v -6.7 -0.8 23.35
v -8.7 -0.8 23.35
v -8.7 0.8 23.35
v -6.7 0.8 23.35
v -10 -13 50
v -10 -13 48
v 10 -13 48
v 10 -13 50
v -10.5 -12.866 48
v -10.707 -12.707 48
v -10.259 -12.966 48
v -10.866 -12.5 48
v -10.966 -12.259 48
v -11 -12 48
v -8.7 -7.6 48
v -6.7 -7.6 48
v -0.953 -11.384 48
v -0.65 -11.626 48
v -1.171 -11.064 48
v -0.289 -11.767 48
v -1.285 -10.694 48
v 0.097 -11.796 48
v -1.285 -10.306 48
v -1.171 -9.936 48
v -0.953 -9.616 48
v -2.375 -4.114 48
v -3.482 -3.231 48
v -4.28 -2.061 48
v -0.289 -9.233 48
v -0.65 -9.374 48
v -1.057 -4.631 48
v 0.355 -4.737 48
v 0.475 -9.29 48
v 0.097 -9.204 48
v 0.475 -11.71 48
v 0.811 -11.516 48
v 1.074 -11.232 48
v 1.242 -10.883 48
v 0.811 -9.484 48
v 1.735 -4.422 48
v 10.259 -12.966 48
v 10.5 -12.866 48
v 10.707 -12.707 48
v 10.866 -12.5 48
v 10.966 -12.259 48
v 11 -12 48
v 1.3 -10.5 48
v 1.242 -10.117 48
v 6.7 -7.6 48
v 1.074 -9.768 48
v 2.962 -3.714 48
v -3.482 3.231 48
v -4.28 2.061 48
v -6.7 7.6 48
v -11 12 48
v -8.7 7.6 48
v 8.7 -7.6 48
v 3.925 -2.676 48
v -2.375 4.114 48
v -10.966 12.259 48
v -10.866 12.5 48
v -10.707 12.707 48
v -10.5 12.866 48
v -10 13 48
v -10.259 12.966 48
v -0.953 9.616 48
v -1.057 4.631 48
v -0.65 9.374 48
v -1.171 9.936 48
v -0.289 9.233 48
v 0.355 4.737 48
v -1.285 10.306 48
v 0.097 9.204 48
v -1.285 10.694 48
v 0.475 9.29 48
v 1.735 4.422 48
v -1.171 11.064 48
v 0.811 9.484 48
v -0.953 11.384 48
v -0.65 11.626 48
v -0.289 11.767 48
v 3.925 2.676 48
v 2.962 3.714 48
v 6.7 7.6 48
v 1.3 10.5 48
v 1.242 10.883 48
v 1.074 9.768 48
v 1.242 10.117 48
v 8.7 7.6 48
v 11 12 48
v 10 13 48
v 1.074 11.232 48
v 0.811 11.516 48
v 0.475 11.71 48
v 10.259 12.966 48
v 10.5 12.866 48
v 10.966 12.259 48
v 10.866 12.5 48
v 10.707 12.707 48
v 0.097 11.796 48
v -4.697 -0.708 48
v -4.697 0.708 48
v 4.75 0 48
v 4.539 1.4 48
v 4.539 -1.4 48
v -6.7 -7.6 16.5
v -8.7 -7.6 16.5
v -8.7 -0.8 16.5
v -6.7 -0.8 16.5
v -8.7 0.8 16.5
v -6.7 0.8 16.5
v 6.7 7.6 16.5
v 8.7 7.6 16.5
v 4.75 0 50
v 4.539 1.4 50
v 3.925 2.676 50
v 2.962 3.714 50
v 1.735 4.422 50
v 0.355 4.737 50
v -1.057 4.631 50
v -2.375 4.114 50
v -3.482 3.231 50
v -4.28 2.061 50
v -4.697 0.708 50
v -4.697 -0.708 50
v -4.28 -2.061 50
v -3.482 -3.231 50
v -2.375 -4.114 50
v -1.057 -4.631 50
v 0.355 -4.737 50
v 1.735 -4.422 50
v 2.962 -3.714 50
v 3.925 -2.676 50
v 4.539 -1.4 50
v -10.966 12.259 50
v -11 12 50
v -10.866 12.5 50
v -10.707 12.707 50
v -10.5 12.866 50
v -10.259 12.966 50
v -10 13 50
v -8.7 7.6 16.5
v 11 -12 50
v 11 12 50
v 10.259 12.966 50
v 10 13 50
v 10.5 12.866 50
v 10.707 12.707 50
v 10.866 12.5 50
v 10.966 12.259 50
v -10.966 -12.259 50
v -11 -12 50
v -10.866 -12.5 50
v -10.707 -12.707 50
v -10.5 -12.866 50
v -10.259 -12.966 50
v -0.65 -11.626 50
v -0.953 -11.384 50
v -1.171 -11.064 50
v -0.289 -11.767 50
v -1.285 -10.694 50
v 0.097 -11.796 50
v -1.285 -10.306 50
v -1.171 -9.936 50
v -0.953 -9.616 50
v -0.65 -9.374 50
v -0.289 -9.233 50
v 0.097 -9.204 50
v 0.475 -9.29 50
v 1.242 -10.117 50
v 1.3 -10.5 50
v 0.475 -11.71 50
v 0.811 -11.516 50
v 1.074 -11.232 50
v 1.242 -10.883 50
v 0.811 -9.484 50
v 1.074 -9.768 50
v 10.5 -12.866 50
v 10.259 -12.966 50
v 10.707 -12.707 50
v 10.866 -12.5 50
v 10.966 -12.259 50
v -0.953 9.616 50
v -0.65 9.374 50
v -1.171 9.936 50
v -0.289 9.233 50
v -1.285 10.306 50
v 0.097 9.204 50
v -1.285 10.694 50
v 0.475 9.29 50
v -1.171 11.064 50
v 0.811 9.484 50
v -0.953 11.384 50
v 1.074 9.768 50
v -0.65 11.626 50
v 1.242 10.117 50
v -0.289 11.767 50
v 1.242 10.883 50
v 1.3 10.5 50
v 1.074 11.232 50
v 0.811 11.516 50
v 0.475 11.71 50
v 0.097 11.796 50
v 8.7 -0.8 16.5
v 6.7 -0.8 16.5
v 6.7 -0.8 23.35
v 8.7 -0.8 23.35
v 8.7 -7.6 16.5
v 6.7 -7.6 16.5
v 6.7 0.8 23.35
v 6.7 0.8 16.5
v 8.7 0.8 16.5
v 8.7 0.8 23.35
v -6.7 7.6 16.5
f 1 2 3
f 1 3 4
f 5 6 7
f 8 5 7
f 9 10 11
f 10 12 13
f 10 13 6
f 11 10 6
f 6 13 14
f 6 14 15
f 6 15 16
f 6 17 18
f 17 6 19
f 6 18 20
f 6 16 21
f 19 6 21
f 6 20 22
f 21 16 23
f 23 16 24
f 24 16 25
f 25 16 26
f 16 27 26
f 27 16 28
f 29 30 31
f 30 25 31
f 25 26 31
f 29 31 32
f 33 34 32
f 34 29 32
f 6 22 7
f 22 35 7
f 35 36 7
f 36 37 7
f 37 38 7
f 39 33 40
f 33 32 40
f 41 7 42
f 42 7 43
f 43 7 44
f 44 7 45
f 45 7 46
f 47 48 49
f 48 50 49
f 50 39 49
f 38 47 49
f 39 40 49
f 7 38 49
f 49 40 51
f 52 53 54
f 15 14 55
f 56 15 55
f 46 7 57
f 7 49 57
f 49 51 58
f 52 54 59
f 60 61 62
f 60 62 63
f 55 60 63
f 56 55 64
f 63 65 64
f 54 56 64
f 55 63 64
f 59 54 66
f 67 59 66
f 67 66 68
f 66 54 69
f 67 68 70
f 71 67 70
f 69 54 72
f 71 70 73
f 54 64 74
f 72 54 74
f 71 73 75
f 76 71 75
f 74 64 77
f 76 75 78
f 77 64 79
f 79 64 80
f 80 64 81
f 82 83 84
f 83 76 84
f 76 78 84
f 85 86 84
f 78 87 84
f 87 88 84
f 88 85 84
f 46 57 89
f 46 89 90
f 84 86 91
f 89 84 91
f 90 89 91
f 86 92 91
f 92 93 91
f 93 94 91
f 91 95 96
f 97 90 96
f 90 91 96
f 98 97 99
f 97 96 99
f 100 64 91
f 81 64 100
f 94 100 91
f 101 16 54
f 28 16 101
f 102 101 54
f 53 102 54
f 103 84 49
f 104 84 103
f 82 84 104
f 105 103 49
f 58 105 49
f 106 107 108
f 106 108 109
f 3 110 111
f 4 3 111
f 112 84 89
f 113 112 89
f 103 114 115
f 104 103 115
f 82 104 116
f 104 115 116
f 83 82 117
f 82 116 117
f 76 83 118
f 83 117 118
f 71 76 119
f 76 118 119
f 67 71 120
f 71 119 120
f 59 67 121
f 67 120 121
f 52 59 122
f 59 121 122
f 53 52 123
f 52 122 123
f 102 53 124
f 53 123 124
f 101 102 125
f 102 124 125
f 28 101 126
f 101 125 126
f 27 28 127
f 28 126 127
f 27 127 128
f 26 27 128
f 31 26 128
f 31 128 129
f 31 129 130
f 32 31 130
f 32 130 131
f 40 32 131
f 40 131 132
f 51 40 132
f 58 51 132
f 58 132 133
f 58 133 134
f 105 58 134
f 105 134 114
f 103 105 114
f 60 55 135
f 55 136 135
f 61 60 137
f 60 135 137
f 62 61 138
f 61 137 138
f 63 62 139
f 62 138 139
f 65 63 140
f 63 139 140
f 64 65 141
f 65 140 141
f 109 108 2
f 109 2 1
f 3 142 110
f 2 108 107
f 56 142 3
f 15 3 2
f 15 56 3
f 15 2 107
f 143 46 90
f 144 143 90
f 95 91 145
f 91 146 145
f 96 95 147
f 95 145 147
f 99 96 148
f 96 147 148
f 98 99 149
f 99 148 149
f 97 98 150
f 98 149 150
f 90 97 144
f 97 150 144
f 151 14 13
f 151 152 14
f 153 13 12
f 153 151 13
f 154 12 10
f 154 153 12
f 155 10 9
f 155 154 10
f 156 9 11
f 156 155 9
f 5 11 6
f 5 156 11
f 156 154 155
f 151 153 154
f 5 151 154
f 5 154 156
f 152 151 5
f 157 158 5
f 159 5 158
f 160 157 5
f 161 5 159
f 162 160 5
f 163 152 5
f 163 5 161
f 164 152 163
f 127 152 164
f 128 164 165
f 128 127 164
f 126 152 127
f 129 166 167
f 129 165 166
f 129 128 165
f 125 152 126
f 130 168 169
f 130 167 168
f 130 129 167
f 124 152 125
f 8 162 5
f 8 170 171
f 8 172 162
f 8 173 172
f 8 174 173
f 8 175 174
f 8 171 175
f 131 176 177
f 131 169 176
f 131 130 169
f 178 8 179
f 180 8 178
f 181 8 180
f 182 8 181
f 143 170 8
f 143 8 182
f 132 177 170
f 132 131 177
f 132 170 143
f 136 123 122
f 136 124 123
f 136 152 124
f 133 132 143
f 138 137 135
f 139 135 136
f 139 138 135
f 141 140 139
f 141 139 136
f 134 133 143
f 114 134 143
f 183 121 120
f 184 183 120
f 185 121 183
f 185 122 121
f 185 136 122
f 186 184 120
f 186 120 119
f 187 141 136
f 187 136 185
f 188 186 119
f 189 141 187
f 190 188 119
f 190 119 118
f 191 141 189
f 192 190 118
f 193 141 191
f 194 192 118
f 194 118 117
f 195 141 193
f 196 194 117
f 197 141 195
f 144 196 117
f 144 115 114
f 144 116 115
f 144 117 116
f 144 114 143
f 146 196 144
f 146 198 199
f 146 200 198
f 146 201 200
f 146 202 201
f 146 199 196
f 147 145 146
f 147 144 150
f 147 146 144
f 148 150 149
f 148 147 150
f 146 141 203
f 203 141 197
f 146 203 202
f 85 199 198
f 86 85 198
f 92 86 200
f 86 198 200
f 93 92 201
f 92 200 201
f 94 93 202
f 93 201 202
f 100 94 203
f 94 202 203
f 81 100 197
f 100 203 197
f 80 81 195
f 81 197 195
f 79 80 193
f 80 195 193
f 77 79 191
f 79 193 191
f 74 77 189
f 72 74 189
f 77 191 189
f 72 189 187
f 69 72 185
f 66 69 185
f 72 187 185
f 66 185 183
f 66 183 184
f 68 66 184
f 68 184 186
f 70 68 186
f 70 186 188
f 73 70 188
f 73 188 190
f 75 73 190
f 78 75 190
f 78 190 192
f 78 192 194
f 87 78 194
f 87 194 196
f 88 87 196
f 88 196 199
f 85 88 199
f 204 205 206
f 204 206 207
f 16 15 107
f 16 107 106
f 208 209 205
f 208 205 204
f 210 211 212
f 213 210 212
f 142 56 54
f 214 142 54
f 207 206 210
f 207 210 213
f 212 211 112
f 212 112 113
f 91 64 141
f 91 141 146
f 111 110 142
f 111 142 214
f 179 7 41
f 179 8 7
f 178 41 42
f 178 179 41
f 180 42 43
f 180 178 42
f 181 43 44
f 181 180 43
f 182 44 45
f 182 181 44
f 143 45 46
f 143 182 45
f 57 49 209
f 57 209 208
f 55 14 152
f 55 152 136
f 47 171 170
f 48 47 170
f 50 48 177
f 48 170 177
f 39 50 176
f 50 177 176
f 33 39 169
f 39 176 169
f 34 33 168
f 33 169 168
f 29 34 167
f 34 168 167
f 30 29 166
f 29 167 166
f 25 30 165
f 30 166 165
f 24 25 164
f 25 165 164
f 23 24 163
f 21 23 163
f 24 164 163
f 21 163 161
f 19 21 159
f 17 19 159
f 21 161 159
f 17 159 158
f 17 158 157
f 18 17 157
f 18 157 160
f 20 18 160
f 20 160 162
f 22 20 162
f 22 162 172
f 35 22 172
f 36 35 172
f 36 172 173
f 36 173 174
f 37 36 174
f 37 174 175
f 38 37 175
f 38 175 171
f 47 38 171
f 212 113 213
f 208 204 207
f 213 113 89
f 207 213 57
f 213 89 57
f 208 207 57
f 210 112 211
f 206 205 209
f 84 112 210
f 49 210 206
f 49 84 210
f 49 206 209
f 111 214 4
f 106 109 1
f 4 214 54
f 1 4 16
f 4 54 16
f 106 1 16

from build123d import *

# Parameters (mm, degrees)
SKETCH004_W     = 22
SKETCH004_H     = 26
PAD003_DEPTH    = 2
SKETCH011_R     = 4.75
POCKET004_DEPTH = 2.001
SKETCH012_W     = 2
SKETCH012_H     = 15.2
PAD006_DEPTH    = 31.5
SKETCH014_R     = 1.3
POCKET006_DEPTH = 33.501
SKETCH015_W     = 18.2
SKETCH015_H     = 1.6
POCKET007_DEPTH = 6.85
FILLET_R        = 1


with BuildPart() as part:
    # Sketch004 → Pad003 (new body)
    with BuildSketch(Plane.XY):
        Rectangle(SKETCH004_W, SKETCH004_H)
    extrude(amount=PAD003_DEPTH)

    # Sketch011 (on Face6 of Pad003) → Pocket004 (cut, through all)
    with BuildSketch(Plane.XY.offset(2)):
        Circle(SKETCH011_R)
    extrude(amount=-POCKET004_DEPTH, mode=Mode.SUBTRACT)

    # Sketch012 (on Face4 of Pocket004) → Pad006 (join)
    with BuildSketch(Plane(origin=(0, 0, 0), x_dir=(1, 0, 0), z_dir=(0, 0, -1))):
        with Locations((-7.7, 0)):
            Rectangle(SKETCH012_W, SKETCH012_H)
        with Locations((7.7, 0)):
            Rectangle(SKETCH012_W, SKETCH012_H)
    extrude(amount=PAD006_DEPTH)

    # Sketch014 (on Face5 of Pad006) → Pocket006 (cut, through all)
    with BuildSketch(Plane.XY.offset(2)):
        with Locations((0, 10.5)):
            Circle(SKETCH014_R)
        with Locations((0, -10.5)):
            Circle(SKETCH014_R)
    extrude(amount=-POCKET006_DEPTH, mode=Mode.SUBTRACT)

    # Sketch015 (on Face18 of Pocket006) → Pocket007 (cut)
    with BuildSketch(Plane(origin=(0, 0, -31.5), x_dir=(1, 0, 0), z_dir=(0, 0, -1))):
        Rectangle(SKETCH015_W, SKETCH015_H)
    extrude(amount=-POCKET007_DEPTH, mode=Mode.SUBTRACT)

    # Fillet
    fillet_edges = [part.edges().sort_by_distance(p)[0] for p in [
        (11, -13, 1),
        (11, 13, 1),
        (-11, 13, 1),
        (-11, -13, 1),
    ]]
    fillet(fillet_edges, radius=FILLET_R)


with BuildPart() as part_1:
    # Body001 placement: moved
    add(part.part.moved(Location((0, 0, 48))))


solid = part_1.part
